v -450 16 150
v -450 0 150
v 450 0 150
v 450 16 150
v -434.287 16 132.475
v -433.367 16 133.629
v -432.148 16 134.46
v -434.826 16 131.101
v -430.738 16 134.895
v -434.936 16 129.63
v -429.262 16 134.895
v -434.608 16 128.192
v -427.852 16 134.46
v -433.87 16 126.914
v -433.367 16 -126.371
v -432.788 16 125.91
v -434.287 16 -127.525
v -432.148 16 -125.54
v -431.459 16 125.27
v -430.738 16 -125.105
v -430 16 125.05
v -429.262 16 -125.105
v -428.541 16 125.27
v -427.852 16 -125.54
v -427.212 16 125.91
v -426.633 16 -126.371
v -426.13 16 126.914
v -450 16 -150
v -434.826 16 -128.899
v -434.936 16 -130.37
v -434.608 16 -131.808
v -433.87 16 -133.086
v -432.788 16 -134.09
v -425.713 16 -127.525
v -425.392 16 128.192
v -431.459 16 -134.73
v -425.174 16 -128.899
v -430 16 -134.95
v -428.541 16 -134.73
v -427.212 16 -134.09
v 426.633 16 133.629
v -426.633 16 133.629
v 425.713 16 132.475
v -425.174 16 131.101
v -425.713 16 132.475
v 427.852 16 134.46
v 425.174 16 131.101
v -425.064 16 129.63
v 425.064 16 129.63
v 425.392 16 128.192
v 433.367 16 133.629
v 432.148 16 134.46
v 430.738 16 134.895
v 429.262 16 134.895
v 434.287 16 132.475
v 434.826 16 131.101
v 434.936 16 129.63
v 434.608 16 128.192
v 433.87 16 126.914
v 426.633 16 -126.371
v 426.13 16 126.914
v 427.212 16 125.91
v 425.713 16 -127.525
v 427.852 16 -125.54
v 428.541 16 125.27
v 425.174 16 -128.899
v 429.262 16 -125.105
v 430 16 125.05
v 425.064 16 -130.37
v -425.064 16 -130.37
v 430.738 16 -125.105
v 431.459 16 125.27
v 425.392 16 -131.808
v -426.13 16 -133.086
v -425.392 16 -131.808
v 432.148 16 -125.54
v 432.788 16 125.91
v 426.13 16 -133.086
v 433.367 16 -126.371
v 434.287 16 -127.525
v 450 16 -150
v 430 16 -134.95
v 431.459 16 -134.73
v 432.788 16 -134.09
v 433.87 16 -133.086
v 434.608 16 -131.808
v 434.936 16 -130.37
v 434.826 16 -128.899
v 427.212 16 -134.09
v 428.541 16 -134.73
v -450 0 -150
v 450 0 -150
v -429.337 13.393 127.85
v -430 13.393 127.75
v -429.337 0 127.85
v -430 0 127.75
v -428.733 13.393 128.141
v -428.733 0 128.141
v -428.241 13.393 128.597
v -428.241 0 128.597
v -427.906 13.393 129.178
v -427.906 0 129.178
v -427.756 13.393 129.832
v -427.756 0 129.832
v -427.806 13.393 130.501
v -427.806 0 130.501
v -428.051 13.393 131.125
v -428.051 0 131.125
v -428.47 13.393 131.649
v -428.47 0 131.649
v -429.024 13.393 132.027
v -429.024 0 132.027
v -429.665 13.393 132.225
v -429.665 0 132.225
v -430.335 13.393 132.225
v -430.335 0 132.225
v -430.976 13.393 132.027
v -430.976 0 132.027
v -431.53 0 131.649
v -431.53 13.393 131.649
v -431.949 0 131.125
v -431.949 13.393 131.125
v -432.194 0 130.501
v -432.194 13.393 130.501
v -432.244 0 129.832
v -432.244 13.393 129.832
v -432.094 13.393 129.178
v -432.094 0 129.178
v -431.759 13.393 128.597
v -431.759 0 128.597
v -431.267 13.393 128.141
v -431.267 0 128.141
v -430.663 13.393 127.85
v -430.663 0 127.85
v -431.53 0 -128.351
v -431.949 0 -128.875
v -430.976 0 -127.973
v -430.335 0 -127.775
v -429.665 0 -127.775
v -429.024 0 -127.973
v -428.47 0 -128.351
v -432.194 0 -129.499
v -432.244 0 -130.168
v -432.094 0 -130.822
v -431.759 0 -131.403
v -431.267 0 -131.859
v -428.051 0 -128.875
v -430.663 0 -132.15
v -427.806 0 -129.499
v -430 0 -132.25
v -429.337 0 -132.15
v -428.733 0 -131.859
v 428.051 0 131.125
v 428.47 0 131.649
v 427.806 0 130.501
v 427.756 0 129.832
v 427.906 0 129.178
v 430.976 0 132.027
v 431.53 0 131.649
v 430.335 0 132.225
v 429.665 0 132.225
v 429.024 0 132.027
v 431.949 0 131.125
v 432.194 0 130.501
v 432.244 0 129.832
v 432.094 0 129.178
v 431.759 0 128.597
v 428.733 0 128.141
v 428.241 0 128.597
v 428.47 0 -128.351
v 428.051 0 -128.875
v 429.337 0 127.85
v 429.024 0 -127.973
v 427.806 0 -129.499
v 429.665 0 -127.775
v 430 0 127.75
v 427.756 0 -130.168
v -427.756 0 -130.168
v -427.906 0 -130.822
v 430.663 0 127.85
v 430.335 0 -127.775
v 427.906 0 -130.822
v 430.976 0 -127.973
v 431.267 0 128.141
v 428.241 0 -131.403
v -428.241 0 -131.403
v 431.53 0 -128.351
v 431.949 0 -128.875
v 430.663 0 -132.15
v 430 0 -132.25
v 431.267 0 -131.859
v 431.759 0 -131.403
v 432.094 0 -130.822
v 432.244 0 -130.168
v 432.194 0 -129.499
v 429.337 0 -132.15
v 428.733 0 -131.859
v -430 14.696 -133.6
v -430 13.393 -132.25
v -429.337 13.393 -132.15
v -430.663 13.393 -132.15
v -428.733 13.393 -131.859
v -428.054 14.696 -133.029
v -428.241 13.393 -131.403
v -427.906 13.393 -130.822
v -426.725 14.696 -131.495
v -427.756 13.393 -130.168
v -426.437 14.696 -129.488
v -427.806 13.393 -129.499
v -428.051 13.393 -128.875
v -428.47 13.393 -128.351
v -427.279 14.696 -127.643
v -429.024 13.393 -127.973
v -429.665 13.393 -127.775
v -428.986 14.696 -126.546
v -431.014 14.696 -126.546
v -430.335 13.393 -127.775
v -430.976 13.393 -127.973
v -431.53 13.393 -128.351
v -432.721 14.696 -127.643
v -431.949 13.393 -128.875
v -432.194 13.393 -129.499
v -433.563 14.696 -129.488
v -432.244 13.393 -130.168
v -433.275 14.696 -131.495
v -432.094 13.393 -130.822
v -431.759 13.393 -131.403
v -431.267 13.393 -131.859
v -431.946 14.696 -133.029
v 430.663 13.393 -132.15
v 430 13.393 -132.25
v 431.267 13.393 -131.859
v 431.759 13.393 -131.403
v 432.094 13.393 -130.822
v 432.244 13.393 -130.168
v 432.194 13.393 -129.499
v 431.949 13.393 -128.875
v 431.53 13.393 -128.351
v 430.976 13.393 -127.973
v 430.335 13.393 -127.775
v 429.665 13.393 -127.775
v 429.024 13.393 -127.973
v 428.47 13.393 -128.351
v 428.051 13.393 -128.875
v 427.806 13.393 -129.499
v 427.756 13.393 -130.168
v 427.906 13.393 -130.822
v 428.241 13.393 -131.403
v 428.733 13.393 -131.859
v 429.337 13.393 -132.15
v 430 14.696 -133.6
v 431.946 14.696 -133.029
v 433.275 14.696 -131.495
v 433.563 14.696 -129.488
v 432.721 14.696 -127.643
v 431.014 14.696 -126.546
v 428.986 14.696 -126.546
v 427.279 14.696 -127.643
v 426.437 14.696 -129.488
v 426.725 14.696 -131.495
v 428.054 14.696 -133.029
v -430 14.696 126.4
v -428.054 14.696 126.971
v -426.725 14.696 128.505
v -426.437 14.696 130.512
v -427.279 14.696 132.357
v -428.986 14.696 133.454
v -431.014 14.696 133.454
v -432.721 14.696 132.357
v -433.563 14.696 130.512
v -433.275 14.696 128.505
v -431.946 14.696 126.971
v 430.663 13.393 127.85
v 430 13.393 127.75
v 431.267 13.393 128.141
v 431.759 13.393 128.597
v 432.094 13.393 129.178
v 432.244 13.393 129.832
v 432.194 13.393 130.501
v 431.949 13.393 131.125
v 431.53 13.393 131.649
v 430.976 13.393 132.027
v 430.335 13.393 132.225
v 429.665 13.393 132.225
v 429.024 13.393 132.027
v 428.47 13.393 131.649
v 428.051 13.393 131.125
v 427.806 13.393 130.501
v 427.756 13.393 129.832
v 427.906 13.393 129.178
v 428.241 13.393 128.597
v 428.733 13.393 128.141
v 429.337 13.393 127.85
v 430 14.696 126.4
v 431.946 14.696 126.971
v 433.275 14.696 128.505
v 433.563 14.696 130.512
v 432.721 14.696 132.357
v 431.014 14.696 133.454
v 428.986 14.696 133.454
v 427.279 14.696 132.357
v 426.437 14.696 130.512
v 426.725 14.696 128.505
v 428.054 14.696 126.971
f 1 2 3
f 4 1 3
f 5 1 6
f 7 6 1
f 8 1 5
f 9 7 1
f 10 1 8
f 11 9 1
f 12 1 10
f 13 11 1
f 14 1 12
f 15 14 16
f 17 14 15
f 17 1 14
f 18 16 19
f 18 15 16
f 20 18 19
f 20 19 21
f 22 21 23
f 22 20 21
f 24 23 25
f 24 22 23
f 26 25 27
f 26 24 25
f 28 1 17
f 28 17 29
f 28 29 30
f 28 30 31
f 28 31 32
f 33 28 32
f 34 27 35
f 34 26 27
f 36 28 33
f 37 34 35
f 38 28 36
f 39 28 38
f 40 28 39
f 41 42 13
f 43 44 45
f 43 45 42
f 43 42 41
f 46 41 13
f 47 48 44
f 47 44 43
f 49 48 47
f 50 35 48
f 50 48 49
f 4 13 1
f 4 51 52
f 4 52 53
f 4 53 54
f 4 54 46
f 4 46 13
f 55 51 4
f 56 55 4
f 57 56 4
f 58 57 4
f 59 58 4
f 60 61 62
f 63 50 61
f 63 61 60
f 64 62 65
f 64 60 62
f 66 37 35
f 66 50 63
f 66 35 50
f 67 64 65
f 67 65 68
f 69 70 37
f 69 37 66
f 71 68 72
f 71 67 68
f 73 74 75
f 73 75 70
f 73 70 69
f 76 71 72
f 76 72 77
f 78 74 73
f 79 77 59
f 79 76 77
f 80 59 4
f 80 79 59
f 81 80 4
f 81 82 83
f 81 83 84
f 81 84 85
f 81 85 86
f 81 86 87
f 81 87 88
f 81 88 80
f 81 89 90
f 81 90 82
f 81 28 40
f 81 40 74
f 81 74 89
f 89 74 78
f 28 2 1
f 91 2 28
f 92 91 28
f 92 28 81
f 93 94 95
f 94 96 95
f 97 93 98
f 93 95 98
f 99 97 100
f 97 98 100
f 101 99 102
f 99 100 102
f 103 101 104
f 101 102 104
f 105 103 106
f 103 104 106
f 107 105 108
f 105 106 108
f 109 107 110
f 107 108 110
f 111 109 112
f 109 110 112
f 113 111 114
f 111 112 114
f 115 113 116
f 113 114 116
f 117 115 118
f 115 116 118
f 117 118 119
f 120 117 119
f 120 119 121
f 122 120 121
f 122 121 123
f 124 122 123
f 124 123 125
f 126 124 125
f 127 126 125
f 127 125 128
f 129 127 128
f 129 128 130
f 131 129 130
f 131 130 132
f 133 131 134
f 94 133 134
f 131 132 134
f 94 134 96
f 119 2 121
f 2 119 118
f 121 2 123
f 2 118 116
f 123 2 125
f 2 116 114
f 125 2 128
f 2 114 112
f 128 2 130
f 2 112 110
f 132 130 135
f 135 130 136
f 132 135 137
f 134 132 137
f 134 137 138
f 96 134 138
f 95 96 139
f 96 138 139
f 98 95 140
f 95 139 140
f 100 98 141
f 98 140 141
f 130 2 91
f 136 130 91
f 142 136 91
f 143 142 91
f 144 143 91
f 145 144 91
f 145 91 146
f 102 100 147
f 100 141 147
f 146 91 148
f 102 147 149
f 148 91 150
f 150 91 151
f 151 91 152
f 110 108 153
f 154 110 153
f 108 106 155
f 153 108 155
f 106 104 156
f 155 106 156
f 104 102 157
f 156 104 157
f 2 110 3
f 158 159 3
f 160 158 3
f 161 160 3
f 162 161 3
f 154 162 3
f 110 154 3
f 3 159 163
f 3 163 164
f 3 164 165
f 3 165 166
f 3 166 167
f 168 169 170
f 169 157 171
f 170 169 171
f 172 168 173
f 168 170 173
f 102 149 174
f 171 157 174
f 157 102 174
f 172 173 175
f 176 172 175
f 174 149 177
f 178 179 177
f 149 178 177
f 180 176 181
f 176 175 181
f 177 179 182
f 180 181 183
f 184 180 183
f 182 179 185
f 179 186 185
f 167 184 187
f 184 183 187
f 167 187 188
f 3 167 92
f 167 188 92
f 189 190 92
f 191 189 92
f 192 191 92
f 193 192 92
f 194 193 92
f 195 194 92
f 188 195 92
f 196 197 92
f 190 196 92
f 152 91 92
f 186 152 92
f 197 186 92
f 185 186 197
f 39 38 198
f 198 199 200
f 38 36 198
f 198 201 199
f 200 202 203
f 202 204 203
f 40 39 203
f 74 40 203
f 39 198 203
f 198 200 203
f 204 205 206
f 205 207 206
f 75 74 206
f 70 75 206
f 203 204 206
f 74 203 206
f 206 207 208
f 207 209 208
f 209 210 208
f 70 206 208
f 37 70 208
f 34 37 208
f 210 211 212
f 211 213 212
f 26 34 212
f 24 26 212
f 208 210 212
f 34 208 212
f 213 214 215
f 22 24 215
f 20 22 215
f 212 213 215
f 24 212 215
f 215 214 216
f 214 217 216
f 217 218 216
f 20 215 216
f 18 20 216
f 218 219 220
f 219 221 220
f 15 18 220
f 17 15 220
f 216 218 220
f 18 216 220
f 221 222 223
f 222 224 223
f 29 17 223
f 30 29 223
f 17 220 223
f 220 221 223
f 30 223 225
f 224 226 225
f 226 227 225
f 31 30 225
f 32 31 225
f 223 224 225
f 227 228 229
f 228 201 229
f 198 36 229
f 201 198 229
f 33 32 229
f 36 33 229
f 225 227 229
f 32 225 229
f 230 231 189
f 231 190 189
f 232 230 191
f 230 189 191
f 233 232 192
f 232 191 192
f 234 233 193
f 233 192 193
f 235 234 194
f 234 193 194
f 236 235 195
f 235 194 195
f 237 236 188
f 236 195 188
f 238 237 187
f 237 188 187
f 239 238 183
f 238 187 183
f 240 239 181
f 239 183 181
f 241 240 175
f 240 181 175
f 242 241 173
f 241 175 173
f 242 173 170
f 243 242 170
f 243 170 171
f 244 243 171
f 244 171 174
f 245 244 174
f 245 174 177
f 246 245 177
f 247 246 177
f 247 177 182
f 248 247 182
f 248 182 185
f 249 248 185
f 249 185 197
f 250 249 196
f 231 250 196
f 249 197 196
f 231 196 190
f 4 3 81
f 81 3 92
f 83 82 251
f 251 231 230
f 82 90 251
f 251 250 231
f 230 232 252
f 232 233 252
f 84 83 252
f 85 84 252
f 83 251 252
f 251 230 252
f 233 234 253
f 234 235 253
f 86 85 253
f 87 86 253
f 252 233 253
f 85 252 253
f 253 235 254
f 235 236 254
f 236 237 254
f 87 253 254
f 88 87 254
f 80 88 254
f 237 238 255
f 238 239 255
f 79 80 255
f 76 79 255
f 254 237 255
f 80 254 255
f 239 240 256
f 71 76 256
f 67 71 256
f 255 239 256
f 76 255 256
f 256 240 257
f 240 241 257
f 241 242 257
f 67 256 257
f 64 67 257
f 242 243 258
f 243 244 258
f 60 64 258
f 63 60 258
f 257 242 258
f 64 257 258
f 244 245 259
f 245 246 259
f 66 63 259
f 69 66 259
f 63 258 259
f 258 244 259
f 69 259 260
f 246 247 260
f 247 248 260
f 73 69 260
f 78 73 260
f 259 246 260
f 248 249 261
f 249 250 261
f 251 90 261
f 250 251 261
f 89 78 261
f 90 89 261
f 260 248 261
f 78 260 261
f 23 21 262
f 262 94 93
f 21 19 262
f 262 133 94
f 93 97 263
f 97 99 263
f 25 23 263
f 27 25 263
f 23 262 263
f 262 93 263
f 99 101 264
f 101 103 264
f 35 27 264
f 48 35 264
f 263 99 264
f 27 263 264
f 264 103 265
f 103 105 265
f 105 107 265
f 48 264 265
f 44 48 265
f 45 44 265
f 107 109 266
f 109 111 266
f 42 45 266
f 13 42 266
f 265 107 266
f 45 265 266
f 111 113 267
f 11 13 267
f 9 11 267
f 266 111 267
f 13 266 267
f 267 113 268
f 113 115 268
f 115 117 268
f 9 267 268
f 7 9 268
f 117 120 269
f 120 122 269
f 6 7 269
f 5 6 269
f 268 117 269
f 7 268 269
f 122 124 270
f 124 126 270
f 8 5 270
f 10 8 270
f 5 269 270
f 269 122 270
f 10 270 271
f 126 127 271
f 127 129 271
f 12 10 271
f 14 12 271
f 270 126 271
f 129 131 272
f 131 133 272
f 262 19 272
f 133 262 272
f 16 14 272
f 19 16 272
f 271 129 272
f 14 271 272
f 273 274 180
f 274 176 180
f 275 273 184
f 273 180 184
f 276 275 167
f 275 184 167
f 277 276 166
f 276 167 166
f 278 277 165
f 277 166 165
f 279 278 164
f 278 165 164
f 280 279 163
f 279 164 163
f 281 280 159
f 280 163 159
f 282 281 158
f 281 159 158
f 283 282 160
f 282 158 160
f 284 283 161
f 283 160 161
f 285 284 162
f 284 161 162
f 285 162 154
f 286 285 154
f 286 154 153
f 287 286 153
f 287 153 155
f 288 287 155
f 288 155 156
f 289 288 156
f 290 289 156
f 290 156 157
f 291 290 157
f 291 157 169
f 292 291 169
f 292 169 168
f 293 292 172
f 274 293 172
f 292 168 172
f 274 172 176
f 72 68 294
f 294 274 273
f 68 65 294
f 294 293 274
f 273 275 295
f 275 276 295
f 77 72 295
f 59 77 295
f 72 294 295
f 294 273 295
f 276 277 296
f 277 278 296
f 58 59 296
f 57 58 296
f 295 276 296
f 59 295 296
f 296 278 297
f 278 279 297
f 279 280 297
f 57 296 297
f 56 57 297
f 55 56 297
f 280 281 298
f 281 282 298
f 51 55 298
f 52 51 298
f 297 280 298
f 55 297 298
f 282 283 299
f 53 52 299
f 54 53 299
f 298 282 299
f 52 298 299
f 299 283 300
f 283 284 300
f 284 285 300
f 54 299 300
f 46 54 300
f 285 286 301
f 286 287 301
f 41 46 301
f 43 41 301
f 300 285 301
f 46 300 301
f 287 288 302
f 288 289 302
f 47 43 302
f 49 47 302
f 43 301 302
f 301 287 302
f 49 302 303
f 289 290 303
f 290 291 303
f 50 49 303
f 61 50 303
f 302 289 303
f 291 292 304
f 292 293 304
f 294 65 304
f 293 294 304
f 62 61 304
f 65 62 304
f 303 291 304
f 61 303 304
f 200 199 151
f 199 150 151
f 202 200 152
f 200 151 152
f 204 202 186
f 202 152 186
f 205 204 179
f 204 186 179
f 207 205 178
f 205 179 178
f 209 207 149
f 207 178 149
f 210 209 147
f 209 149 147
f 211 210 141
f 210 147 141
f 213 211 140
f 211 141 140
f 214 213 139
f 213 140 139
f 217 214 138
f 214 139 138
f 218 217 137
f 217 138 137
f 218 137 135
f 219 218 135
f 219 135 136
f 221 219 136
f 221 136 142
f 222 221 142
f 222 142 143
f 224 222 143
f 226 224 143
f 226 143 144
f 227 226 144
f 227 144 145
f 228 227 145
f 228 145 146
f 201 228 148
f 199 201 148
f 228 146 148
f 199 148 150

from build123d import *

# Parameters (mm, degrees)
SKETCH_2_W                  = 900
SKETCH_2_H                  = 300
EXTRUDE_1_DEPTH             = 16
CSK_M4_1_D                  = 4.5
CSK_M4_1_CSINK_D            = 9.9
CSK_M4_1_CSINK_ANGLE        = 92
PATTERN_LINEAR_1_COUNT      = 2
PATTERN_LINEAR_1_PITCH      = 860
PATTERN_LINEAR_1_COUNT_DIR2 = 2
PATTERN_LINEAR_1_PITCH_DIR2 = 260


with BuildPart() as part:
    # Эскиз2 → Бобышка-Вытянуть1 (new body)
    with BuildSketch(Plane(origin=(0, 0, 0), x_dir=(1, 0, 0), z_dir=(0, 1, 0))):
        Rectangle(SKETCH_2_W, SKETCH_2_H)
    extrude(amount=EXTRUDE_1_DEPTH)

    # CSK для M4 винта с полупотайной головкой и крестообразным шлицем1 (through all)
    with Locations(Plane(origin=(-430, 16, -130), x_dir=(0, 0, 1), z_dir=(0, 1, 0))):
        with Locations((0, 0)):
            csk_m4_1 = CounterSinkHole(CSK_M4_1_D / 2, CSK_M4_1_CSINK_D / 2, counter_sink_angle=CSK_M4_1_CSINK_ANGLE)

    # Линейный массив1: CSK _ M4 _ _ _ _ _ _ _1 2 × 2
    with Locations(*[(i * PATTERN_LINEAR_1_PITCH, 0, j * PATTERN_LINEAR_1_PITCH_DIR2) for i in range(PATTERN_LINEAR_1_COUNT) for j in range(PATTERN_LINEAR_1_COUNT_DIR2) if (i, j) != (0, 0)]):
        add(csk_m4_1, mode=Mode.SUBTRACT)


solid = part.part
